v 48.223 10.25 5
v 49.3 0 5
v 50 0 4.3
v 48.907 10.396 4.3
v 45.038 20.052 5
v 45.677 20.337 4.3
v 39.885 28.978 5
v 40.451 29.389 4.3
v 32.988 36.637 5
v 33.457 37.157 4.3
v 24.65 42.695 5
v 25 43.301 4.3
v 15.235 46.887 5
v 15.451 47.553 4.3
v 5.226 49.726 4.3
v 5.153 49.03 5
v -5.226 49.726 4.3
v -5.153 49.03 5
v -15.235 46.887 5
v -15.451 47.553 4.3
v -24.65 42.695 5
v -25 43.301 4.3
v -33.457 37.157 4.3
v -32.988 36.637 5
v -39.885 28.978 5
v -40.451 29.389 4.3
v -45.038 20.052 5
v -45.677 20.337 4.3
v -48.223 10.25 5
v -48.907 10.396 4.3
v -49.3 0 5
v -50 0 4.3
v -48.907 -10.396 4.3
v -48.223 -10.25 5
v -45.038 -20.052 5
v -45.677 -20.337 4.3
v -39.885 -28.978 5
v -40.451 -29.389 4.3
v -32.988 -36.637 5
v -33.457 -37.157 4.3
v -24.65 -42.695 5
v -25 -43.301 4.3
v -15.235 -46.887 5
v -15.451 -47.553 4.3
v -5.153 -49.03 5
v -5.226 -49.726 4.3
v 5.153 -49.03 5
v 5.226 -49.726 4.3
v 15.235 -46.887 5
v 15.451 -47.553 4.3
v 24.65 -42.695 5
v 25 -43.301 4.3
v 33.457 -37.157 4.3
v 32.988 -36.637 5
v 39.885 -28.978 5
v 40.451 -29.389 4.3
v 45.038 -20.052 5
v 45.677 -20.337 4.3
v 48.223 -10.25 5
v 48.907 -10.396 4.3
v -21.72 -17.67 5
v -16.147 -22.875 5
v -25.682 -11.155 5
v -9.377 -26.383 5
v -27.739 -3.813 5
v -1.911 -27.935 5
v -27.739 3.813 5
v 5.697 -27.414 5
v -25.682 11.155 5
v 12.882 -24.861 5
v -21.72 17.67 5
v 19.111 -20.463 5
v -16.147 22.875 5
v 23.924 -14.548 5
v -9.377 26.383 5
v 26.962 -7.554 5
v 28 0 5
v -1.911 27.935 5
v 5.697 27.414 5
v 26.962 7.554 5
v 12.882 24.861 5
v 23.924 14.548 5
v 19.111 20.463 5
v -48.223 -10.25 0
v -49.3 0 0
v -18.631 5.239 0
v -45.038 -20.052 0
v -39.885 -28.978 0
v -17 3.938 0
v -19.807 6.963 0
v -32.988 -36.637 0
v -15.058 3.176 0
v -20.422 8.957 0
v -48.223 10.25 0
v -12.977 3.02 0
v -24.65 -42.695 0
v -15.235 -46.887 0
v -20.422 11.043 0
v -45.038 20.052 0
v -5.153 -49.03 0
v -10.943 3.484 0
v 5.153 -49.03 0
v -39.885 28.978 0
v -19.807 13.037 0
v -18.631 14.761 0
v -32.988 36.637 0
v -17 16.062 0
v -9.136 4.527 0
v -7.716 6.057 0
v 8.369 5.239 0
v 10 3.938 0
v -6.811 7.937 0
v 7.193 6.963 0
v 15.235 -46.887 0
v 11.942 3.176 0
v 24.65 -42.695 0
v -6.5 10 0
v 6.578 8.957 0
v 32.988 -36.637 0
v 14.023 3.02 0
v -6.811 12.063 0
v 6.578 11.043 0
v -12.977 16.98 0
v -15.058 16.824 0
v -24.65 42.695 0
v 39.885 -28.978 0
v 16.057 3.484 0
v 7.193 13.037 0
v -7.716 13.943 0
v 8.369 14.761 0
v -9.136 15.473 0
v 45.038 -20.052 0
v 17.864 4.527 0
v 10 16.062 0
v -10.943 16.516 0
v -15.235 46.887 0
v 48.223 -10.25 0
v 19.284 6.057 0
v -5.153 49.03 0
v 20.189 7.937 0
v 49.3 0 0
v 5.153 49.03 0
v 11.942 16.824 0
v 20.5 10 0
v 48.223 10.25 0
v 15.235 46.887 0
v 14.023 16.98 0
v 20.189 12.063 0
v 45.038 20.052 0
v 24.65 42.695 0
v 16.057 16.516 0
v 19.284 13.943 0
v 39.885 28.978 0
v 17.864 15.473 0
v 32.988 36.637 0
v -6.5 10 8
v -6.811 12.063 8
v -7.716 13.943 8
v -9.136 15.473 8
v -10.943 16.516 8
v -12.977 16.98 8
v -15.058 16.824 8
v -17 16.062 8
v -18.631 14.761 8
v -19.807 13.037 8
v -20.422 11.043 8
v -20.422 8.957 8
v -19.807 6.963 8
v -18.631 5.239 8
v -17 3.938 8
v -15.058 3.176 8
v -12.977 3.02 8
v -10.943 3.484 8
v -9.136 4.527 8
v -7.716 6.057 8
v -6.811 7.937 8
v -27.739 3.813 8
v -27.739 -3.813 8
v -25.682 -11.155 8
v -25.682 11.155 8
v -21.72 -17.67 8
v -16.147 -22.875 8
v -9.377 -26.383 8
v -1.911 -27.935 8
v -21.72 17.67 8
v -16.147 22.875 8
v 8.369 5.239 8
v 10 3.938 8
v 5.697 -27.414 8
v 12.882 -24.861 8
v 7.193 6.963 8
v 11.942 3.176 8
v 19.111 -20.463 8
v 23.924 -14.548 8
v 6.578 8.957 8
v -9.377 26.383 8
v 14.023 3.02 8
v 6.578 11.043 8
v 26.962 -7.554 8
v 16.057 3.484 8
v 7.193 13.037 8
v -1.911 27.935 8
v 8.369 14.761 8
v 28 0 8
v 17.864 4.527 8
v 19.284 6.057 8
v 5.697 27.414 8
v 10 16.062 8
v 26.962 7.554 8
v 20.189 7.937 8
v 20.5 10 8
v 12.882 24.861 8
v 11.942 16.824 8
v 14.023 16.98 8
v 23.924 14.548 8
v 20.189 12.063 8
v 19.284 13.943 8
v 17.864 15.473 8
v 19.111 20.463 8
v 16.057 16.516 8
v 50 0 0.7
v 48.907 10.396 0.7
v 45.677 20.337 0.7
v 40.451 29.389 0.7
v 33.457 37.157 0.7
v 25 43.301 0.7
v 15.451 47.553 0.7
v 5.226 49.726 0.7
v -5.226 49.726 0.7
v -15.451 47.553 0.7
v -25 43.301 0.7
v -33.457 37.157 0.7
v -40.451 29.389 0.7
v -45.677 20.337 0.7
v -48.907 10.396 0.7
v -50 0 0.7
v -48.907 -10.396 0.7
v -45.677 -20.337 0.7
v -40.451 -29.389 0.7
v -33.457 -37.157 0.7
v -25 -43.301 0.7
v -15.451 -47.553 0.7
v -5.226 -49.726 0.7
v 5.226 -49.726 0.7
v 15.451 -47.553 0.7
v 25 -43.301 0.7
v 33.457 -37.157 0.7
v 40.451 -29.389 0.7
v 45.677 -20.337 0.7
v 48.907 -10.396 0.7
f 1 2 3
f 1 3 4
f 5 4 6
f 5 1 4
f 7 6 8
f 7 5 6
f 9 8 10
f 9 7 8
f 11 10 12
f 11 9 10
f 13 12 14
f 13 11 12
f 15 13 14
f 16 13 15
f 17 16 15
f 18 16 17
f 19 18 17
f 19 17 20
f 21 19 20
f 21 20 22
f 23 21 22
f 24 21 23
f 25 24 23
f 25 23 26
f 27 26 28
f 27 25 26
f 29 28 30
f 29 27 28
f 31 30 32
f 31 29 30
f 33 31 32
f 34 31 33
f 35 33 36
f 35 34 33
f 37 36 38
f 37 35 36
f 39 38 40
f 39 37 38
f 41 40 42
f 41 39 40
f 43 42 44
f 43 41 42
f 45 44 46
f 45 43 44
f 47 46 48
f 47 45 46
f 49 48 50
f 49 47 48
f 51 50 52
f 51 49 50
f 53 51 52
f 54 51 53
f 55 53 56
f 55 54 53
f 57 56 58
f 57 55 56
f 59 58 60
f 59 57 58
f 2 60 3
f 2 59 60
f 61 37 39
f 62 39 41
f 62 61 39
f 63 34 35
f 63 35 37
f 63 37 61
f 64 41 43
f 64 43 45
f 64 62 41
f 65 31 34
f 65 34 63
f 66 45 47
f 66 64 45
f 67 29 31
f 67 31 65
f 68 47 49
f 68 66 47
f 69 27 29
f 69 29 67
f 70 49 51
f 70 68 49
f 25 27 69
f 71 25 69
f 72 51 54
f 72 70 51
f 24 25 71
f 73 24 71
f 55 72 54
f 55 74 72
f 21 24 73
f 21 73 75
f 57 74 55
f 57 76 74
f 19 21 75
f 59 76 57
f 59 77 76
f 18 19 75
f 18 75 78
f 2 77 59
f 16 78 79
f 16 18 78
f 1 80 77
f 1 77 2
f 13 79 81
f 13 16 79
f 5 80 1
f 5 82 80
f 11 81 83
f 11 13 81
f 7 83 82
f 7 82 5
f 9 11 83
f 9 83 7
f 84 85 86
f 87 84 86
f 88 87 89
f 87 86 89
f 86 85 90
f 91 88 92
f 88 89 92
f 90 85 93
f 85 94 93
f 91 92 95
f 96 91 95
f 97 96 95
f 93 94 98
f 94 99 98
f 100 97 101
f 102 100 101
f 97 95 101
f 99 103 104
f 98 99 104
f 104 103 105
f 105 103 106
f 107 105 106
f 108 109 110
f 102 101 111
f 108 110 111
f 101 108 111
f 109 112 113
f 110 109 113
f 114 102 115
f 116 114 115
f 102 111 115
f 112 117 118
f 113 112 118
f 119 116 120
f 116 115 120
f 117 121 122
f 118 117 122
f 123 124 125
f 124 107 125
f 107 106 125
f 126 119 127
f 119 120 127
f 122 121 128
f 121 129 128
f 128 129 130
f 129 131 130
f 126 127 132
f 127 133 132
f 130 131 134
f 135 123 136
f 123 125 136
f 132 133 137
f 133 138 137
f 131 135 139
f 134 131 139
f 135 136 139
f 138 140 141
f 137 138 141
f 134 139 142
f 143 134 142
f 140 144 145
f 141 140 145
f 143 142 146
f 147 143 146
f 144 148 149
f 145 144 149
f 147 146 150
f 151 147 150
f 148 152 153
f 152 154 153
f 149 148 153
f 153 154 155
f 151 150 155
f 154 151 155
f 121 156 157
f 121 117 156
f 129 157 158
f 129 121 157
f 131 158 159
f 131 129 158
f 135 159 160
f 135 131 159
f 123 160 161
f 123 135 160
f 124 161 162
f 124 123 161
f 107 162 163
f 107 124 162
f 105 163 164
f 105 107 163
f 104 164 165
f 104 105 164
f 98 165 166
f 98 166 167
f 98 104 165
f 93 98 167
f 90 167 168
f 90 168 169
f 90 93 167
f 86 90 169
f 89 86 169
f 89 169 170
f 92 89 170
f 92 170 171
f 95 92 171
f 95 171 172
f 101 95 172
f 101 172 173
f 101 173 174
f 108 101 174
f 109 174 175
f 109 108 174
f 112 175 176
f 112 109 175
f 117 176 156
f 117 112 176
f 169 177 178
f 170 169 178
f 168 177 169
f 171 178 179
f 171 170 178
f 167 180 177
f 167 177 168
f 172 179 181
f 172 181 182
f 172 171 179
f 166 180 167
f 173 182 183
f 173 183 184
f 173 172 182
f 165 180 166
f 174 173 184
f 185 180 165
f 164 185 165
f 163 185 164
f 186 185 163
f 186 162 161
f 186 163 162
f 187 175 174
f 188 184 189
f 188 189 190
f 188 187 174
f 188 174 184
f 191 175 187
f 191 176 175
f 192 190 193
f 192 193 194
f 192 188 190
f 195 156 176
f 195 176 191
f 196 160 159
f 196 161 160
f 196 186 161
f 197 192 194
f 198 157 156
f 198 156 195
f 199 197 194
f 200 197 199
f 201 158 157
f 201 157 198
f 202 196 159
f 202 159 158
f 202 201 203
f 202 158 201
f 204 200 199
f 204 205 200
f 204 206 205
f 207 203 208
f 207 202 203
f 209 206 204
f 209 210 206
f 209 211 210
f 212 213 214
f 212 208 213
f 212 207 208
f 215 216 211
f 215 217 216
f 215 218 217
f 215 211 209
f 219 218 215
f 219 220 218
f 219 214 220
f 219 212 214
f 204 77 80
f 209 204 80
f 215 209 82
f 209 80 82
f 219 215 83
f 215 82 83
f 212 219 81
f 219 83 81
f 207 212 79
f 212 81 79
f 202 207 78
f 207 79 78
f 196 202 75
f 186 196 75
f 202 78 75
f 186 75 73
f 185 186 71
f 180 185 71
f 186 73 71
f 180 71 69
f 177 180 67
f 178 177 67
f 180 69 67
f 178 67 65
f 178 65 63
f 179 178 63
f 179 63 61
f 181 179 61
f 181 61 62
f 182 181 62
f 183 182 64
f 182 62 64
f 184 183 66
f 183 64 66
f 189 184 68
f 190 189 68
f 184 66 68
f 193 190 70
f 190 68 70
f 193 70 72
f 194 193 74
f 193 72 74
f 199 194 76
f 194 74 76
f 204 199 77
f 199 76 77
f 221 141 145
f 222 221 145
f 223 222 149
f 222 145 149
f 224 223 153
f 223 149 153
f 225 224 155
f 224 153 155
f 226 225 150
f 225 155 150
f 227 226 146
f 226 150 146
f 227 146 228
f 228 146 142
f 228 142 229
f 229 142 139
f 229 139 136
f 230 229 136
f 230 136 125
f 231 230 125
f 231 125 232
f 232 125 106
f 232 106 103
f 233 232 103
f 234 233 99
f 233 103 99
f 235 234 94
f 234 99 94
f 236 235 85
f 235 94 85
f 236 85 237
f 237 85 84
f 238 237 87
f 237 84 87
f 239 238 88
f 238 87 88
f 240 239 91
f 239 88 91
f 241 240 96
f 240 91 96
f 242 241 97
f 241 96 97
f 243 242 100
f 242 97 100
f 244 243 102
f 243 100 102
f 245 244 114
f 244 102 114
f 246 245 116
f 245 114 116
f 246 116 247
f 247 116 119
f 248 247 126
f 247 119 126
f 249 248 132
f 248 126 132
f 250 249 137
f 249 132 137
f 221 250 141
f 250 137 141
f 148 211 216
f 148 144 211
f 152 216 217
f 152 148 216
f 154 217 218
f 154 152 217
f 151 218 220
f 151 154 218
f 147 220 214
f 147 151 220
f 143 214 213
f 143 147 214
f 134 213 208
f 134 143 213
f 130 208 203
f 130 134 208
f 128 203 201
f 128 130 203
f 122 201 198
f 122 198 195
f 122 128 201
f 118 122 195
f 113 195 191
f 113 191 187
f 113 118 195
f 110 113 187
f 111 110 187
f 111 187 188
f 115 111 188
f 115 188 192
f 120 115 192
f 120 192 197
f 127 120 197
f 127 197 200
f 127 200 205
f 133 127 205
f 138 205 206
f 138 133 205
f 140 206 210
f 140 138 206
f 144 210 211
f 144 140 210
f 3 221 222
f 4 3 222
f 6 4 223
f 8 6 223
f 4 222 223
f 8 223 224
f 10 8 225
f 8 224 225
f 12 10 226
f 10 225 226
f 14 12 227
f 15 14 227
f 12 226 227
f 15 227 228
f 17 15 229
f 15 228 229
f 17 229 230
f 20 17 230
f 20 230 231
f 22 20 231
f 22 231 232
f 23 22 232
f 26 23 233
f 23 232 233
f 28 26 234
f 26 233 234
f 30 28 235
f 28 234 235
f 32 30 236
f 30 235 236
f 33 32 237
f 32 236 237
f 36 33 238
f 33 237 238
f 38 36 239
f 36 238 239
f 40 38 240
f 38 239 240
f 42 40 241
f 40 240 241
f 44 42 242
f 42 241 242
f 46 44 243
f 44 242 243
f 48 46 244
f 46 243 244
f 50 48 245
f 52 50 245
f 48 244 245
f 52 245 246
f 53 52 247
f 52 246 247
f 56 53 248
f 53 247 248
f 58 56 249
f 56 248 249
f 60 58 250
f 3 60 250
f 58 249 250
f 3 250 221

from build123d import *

# Parameters (mm, degrees)
F0_R     = 50
F0_R_2   = 7
F1_DEPTH = 5
F2_SIZE  = 0.7
F3_R     = 28
F4_DEPTH = 3
F5_DEPTH = 3


with BuildPart() as f1:
    # F0 (on Top) → F1 (new body)
    with BuildSketch(Plane.XY):
        Circle(F0_R)
        with Locations((-13.5, 10)):
            Circle(F0_R_2, mode=Mode.SUBTRACT)
        with Locations((13.5, 10)):
            Circle(F0_R_2, mode=Mode.SUBTRACT)
    extrude(amount=F1_DEPTH)

    # F2
    f2_edges = [f1.edges().sort_by_distance(p)[0] for p in [
        (-50, 0, 0),
        (50, 0, 2.5),
        (-50, 0, 5),
    ]]
    chamfer(f2_edges, length=F2_SIZE)

    # F3 (on face) → F4 (join)
    with BuildSketch(Plane.XY.offset(5)):
        Circle(F3_R)
    extrude(amount=F4_DEPTH)

    # F5 (cut, through all): faces of the model
    f5_faces = [f1.faces().sort_by_distance(p)[0] for p in [
        (-13.5, 10, 5),
        (13.5, 10, 5),
    ]]
    extrude(f5_faces, amount=-F5_DEPTH, mode=Mode.SUBTRACT)


solid = f1.part
